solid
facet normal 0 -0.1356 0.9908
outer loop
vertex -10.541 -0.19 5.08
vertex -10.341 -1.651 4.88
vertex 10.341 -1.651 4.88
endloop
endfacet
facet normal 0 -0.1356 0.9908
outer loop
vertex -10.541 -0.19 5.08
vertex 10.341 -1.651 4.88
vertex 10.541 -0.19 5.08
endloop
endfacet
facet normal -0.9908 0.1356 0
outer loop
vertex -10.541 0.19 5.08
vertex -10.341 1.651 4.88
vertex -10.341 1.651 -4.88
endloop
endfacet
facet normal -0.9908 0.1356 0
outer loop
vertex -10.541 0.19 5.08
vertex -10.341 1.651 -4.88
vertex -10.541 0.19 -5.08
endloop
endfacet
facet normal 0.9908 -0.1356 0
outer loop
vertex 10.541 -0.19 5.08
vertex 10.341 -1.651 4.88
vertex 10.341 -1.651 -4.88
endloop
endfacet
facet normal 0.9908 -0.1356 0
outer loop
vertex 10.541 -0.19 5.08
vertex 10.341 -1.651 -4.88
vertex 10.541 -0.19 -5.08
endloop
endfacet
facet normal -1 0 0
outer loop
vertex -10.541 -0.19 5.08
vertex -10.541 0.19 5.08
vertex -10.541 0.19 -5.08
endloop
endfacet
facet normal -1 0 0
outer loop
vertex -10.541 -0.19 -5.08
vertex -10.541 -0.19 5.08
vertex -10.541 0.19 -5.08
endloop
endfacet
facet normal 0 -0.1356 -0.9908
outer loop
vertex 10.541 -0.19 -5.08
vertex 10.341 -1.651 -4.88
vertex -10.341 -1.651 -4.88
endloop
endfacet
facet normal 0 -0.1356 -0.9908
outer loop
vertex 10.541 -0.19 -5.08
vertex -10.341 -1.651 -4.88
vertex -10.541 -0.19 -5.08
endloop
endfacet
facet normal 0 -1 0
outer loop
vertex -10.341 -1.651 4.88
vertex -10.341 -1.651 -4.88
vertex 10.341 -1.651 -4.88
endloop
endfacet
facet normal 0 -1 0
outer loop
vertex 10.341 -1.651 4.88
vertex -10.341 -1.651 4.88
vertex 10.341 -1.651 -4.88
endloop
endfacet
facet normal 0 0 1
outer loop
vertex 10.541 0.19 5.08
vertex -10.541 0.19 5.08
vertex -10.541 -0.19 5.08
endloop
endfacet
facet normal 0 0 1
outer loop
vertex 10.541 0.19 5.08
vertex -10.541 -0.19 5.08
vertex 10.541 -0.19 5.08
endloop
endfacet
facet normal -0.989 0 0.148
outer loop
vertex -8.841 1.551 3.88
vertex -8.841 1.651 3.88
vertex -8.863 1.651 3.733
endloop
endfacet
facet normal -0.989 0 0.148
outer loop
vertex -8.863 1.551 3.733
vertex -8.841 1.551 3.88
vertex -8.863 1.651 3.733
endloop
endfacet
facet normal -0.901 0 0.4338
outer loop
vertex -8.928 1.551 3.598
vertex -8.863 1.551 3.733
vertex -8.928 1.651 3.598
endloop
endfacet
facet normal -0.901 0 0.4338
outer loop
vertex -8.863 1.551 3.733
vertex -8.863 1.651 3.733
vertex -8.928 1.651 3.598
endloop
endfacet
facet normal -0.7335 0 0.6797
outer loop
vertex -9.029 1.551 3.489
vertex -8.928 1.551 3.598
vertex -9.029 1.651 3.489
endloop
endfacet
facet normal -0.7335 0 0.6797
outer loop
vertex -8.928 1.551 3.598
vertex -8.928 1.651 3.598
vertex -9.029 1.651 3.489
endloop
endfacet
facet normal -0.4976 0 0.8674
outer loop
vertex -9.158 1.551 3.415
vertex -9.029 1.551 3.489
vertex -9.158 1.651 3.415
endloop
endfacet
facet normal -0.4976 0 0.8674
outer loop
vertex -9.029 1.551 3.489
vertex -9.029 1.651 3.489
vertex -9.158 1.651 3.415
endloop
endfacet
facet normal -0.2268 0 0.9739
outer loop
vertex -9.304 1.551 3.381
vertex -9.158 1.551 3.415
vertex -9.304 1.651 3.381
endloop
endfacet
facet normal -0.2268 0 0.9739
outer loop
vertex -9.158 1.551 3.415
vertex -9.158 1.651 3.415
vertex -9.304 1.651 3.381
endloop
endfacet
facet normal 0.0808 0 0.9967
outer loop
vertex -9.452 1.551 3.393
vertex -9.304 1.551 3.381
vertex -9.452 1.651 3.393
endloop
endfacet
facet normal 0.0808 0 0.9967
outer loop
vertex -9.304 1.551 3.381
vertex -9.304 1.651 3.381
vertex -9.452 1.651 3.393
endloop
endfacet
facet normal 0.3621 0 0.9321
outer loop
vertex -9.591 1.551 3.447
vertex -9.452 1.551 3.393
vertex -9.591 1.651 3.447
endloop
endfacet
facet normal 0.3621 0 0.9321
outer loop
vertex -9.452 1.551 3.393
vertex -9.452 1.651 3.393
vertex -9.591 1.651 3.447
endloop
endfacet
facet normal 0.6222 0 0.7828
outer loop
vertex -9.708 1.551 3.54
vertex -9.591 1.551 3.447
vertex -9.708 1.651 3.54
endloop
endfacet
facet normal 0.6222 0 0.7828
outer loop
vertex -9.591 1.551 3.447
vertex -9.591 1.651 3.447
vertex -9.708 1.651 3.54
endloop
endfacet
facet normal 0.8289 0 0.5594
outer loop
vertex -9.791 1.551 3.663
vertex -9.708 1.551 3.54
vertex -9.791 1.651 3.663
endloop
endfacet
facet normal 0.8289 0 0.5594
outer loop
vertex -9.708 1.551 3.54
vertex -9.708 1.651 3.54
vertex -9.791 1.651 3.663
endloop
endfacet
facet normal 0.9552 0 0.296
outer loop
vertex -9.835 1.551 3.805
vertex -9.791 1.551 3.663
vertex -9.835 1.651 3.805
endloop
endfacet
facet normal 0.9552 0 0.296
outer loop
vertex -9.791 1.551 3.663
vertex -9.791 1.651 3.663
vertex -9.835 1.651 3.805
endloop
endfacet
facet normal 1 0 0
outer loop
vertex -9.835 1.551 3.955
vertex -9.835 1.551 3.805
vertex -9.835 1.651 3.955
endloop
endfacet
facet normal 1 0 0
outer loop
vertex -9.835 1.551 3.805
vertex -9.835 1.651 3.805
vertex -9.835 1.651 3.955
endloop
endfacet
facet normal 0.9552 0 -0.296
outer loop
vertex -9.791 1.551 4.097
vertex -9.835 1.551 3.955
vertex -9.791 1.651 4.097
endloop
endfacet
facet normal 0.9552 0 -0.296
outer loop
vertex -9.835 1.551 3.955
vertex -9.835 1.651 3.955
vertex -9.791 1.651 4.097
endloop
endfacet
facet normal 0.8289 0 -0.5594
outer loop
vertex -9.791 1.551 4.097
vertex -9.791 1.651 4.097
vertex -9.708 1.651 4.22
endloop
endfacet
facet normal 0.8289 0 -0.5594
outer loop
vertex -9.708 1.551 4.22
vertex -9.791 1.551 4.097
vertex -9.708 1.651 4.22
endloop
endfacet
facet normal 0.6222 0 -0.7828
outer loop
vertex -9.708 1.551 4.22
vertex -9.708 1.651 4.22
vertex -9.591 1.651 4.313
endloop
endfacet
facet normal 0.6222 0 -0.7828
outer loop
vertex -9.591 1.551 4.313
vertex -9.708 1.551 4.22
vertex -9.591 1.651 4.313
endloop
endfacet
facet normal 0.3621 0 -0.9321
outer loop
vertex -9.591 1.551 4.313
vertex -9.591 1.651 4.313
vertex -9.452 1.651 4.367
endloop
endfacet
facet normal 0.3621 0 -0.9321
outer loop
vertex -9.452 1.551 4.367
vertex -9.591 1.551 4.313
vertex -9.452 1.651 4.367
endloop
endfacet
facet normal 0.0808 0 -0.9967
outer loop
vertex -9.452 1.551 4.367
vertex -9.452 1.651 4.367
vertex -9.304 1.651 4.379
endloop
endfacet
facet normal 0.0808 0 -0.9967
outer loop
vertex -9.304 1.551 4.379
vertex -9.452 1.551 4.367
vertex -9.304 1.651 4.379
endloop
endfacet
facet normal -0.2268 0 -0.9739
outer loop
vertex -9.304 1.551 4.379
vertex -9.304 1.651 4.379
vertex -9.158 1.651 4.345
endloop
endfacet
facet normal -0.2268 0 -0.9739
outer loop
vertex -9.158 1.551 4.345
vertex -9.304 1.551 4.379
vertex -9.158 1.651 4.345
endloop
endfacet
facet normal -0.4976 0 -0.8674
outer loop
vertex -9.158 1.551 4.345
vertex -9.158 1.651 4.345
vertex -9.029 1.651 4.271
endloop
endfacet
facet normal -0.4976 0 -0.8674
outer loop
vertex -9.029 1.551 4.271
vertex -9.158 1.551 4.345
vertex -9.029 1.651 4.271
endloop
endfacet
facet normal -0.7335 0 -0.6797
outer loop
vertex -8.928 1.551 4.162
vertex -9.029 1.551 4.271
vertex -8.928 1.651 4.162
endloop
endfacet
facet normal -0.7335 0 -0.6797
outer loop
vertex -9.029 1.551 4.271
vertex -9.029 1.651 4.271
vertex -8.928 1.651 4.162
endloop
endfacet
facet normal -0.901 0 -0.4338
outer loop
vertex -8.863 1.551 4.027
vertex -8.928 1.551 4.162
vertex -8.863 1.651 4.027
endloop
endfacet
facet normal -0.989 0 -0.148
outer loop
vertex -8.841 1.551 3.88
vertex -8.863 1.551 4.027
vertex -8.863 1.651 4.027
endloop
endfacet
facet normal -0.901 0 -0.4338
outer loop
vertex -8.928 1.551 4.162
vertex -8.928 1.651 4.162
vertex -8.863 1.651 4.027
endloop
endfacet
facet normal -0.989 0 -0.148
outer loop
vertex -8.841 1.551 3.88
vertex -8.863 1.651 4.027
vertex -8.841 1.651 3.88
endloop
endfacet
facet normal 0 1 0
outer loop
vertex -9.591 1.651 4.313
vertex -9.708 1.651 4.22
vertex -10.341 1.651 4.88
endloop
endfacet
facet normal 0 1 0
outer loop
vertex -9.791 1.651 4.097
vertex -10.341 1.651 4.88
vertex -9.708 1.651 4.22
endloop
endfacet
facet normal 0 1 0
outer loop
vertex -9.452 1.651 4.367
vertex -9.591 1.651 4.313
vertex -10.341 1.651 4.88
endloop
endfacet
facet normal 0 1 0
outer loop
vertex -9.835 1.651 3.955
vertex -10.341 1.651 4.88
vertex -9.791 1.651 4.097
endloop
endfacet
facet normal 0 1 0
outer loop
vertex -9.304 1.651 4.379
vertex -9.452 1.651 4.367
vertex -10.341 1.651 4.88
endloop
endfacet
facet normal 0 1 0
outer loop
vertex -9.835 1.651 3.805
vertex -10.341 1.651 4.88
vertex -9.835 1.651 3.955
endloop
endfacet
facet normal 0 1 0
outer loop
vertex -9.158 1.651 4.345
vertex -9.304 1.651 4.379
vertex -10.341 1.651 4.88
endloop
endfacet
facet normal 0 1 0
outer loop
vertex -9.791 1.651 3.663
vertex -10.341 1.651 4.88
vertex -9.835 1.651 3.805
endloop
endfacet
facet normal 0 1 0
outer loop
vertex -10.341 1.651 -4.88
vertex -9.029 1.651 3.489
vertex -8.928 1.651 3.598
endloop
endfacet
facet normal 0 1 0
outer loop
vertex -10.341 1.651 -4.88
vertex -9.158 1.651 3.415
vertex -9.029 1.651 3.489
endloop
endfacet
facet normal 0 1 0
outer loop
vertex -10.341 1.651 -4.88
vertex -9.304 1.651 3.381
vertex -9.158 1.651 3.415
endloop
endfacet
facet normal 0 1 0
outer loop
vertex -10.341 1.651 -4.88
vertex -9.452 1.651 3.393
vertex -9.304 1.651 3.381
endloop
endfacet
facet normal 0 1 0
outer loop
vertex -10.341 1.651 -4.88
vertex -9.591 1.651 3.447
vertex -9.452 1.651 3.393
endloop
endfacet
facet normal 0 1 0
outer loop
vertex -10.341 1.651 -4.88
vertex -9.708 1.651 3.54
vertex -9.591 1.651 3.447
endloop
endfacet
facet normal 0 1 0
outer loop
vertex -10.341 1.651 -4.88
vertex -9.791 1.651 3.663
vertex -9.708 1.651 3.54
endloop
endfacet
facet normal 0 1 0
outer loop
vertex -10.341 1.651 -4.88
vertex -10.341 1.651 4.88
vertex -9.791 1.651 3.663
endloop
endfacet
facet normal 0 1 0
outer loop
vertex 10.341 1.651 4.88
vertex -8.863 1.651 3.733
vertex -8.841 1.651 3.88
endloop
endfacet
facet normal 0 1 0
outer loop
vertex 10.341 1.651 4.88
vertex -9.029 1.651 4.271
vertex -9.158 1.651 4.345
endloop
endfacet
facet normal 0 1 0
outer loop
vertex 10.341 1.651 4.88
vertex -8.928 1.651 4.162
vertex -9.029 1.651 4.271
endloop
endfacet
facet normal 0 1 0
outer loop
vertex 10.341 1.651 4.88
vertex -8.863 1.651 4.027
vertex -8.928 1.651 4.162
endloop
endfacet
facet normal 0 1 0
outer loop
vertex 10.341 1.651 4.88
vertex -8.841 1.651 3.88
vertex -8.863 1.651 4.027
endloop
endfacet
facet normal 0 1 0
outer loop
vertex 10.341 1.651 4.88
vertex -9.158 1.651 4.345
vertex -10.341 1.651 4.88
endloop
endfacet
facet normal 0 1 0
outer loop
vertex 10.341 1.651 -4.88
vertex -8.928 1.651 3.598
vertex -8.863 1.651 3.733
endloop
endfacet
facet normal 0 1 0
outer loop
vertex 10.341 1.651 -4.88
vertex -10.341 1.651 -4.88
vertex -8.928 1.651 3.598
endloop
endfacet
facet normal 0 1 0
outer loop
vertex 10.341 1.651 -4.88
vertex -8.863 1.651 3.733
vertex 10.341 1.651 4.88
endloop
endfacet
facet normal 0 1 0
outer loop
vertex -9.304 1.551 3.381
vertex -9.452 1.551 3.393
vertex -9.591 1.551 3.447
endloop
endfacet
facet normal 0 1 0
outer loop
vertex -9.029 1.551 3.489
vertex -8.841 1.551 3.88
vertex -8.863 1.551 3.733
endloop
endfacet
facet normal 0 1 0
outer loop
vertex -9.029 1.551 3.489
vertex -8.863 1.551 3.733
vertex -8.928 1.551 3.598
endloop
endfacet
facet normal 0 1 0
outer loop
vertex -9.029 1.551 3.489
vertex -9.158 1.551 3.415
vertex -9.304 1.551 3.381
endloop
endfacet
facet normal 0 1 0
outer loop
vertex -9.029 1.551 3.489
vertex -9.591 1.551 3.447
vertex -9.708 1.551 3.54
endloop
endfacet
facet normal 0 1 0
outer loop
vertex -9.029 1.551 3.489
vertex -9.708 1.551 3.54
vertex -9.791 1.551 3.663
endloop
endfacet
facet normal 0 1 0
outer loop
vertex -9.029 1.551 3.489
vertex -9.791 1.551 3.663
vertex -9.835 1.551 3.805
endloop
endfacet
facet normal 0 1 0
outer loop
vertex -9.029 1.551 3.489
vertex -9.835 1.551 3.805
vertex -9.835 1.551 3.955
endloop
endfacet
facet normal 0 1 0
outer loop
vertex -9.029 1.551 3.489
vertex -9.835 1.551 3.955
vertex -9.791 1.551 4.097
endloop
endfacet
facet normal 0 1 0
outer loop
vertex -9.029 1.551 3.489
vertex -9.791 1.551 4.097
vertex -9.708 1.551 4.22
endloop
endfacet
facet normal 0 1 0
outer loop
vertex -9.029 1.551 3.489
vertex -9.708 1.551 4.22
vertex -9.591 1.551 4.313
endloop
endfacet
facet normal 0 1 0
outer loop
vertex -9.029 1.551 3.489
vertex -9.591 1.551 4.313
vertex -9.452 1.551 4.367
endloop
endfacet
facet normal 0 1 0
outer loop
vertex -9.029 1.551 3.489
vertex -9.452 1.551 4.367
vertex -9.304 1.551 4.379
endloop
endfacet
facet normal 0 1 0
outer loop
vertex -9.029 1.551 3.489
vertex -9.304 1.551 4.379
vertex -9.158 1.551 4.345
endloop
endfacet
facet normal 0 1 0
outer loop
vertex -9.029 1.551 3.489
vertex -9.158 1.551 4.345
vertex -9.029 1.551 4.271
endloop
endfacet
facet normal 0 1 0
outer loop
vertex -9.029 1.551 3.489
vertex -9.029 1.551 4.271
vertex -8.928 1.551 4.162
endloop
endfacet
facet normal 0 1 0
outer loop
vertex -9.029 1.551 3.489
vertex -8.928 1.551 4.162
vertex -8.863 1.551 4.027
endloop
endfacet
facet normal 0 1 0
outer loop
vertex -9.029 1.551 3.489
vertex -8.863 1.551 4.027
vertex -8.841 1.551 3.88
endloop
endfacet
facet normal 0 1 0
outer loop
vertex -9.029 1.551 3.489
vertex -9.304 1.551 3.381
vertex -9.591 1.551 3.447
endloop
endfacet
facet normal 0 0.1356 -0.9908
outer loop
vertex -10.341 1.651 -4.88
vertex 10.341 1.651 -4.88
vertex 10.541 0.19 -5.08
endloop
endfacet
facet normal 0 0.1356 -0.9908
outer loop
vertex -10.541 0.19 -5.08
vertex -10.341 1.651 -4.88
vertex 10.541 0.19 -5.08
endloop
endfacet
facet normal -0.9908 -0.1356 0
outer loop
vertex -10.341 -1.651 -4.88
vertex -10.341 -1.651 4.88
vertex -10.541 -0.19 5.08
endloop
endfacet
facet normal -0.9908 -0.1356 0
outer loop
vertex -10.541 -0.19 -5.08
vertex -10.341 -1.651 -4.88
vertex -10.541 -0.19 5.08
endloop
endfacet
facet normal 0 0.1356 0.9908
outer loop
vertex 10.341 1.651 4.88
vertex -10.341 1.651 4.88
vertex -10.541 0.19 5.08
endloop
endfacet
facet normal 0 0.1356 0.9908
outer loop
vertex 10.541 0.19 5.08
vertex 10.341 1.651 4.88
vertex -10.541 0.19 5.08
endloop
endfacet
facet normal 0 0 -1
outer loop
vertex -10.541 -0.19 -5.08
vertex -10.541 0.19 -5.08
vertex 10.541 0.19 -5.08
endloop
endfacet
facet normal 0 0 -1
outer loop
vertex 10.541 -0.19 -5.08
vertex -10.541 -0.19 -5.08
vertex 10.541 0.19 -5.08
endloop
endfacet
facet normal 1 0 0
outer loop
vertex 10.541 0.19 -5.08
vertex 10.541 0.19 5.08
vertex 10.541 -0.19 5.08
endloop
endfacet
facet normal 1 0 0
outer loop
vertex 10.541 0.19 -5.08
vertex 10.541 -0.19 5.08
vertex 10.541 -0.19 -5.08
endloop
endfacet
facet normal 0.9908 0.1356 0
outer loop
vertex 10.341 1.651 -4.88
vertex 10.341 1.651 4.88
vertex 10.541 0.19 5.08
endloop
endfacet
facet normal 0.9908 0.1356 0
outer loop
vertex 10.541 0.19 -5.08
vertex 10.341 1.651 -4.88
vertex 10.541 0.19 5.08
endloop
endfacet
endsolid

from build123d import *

# Parameters (mm, degrees)
SKETCH1_W            = 21.082
SKETCH1_H            = 10.16
BOSS_EXTRUDE1_DEPTH  = 1.651
CUT_EXTRUDE1_DEPTH   = 22.082
MIRROR2_COPY_1_DEPTH = 22.082
CUT_EXTRUDE2_DEPTH   = 11.16
MIRROR4_COPY_1_DEPTH = 11.16
SKETCH4_R            = 0.5
CUT_EXTRUDE3_DEPTH   = 0.1


with BuildPart() as part:
    # Sketch1 → Boss-Extrude1 (new body, symmetric)
    with BuildSketch(Plane(origin=(0, 0, 0), x_dir=(1, 0, 0), z_dir=(0, 1, 0))):
        Rectangle(SKETCH1_W, SKETCH1_H)
    extrude(amount=BOSS_EXTRUDE1_DEPTH, both=True)

    # Sketch2 → Cut-Extrude1 (cut, through all)
    with BuildSketch(Plane(origin=(10.541, 0, 0), x_dir=(0, 0, -1), z_dir=(1, 0, 0))):
        Polygon((-5.08, 1.651), (-4.88, 1.651), (-5.08, 0.1905), align=None)
    cut_extrude1 = extrude(amount=-CUT_EXTRUDE1_DEPTH, mode=Mode.SUBTRACT)

    # Mirror1: Cut-Extrude1 across plane
    add(cut_extrude1.mirror(Plane.XY), mode=Mode.SUBTRACT)

    # Mirror2: Cut-Extrude1 across plane
    add(cut_extrude1.mirror(Plane.ZX), mode=Mode.SUBTRACT)

    # Mirror2 copy 1 sketch → Mirror2 copy 1 (cut, through all)
    with BuildSketch(Plane(origin=(10.541, 0, 0), x_dir=(0, 0, 1), z_dir=(1, 0, 0))):
        Polygon((-5.08, 1.651), (-4.88, 1.651), (-5.08, 0.1905), align=None)
    extrude(amount=-MIRROR2_COPY_1_DEPTH, mode=Mode.SUBTRACT)

    # Sketch3 → Cut-Extrude2 (cut, through all)
    with BuildSketch(Plane.XY.offset(5.08)):
        Polygon((10.541, 0.1905), (10.541, 1.651), (10.341, 1.651), align=None)
    cut_extrude2 = extrude(amount=-CUT_EXTRUDE2_DEPTH, mode=Mode.SUBTRACT)

    # Mirror3: Cut-Extrude2 across plane
    add(cut_extrude2.mirror(Plane.ZX), mode=Mode.SUBTRACT)

    # Mirror4: Cut-Extrude2 across plane
    add(cut_extrude2.mirror(Plane(origin=(0, 0, 0), x_dir=(0, 0, 1), z_dir=(1, 0, 0))), mode=Mode.SUBTRACT)

    # Mirror4 copy 1 sketch → Mirror4 copy 1 (cut, through all)
    with BuildSketch(Plane(origin=(0, 0, 5.08), x_dir=(-1, 0, 0), z_dir=(0, 0, 1))):
        Polygon((10.541, 0.1905), (10.541, 1.651), (10.341, 1.651), align=None)
    extrude(amount=-MIRROR4_COPY_1_DEPTH, mode=Mode.SUBTRACT)

    # Sketch4 → Cut-Extrude3 (cut)
    with BuildSketch(Plane(origin=(0, 1.651, 0), x_dir=(1, 0, 0), z_dir=(0, 1, 0))):
        with Locations((-9.341, -3.88)):
            Circle(SKETCH4_R)
    extrude(amount=-CUT_EXTRUDE3_DEPTH, mode=Mode.SUBTRACT)


solid = part.part
